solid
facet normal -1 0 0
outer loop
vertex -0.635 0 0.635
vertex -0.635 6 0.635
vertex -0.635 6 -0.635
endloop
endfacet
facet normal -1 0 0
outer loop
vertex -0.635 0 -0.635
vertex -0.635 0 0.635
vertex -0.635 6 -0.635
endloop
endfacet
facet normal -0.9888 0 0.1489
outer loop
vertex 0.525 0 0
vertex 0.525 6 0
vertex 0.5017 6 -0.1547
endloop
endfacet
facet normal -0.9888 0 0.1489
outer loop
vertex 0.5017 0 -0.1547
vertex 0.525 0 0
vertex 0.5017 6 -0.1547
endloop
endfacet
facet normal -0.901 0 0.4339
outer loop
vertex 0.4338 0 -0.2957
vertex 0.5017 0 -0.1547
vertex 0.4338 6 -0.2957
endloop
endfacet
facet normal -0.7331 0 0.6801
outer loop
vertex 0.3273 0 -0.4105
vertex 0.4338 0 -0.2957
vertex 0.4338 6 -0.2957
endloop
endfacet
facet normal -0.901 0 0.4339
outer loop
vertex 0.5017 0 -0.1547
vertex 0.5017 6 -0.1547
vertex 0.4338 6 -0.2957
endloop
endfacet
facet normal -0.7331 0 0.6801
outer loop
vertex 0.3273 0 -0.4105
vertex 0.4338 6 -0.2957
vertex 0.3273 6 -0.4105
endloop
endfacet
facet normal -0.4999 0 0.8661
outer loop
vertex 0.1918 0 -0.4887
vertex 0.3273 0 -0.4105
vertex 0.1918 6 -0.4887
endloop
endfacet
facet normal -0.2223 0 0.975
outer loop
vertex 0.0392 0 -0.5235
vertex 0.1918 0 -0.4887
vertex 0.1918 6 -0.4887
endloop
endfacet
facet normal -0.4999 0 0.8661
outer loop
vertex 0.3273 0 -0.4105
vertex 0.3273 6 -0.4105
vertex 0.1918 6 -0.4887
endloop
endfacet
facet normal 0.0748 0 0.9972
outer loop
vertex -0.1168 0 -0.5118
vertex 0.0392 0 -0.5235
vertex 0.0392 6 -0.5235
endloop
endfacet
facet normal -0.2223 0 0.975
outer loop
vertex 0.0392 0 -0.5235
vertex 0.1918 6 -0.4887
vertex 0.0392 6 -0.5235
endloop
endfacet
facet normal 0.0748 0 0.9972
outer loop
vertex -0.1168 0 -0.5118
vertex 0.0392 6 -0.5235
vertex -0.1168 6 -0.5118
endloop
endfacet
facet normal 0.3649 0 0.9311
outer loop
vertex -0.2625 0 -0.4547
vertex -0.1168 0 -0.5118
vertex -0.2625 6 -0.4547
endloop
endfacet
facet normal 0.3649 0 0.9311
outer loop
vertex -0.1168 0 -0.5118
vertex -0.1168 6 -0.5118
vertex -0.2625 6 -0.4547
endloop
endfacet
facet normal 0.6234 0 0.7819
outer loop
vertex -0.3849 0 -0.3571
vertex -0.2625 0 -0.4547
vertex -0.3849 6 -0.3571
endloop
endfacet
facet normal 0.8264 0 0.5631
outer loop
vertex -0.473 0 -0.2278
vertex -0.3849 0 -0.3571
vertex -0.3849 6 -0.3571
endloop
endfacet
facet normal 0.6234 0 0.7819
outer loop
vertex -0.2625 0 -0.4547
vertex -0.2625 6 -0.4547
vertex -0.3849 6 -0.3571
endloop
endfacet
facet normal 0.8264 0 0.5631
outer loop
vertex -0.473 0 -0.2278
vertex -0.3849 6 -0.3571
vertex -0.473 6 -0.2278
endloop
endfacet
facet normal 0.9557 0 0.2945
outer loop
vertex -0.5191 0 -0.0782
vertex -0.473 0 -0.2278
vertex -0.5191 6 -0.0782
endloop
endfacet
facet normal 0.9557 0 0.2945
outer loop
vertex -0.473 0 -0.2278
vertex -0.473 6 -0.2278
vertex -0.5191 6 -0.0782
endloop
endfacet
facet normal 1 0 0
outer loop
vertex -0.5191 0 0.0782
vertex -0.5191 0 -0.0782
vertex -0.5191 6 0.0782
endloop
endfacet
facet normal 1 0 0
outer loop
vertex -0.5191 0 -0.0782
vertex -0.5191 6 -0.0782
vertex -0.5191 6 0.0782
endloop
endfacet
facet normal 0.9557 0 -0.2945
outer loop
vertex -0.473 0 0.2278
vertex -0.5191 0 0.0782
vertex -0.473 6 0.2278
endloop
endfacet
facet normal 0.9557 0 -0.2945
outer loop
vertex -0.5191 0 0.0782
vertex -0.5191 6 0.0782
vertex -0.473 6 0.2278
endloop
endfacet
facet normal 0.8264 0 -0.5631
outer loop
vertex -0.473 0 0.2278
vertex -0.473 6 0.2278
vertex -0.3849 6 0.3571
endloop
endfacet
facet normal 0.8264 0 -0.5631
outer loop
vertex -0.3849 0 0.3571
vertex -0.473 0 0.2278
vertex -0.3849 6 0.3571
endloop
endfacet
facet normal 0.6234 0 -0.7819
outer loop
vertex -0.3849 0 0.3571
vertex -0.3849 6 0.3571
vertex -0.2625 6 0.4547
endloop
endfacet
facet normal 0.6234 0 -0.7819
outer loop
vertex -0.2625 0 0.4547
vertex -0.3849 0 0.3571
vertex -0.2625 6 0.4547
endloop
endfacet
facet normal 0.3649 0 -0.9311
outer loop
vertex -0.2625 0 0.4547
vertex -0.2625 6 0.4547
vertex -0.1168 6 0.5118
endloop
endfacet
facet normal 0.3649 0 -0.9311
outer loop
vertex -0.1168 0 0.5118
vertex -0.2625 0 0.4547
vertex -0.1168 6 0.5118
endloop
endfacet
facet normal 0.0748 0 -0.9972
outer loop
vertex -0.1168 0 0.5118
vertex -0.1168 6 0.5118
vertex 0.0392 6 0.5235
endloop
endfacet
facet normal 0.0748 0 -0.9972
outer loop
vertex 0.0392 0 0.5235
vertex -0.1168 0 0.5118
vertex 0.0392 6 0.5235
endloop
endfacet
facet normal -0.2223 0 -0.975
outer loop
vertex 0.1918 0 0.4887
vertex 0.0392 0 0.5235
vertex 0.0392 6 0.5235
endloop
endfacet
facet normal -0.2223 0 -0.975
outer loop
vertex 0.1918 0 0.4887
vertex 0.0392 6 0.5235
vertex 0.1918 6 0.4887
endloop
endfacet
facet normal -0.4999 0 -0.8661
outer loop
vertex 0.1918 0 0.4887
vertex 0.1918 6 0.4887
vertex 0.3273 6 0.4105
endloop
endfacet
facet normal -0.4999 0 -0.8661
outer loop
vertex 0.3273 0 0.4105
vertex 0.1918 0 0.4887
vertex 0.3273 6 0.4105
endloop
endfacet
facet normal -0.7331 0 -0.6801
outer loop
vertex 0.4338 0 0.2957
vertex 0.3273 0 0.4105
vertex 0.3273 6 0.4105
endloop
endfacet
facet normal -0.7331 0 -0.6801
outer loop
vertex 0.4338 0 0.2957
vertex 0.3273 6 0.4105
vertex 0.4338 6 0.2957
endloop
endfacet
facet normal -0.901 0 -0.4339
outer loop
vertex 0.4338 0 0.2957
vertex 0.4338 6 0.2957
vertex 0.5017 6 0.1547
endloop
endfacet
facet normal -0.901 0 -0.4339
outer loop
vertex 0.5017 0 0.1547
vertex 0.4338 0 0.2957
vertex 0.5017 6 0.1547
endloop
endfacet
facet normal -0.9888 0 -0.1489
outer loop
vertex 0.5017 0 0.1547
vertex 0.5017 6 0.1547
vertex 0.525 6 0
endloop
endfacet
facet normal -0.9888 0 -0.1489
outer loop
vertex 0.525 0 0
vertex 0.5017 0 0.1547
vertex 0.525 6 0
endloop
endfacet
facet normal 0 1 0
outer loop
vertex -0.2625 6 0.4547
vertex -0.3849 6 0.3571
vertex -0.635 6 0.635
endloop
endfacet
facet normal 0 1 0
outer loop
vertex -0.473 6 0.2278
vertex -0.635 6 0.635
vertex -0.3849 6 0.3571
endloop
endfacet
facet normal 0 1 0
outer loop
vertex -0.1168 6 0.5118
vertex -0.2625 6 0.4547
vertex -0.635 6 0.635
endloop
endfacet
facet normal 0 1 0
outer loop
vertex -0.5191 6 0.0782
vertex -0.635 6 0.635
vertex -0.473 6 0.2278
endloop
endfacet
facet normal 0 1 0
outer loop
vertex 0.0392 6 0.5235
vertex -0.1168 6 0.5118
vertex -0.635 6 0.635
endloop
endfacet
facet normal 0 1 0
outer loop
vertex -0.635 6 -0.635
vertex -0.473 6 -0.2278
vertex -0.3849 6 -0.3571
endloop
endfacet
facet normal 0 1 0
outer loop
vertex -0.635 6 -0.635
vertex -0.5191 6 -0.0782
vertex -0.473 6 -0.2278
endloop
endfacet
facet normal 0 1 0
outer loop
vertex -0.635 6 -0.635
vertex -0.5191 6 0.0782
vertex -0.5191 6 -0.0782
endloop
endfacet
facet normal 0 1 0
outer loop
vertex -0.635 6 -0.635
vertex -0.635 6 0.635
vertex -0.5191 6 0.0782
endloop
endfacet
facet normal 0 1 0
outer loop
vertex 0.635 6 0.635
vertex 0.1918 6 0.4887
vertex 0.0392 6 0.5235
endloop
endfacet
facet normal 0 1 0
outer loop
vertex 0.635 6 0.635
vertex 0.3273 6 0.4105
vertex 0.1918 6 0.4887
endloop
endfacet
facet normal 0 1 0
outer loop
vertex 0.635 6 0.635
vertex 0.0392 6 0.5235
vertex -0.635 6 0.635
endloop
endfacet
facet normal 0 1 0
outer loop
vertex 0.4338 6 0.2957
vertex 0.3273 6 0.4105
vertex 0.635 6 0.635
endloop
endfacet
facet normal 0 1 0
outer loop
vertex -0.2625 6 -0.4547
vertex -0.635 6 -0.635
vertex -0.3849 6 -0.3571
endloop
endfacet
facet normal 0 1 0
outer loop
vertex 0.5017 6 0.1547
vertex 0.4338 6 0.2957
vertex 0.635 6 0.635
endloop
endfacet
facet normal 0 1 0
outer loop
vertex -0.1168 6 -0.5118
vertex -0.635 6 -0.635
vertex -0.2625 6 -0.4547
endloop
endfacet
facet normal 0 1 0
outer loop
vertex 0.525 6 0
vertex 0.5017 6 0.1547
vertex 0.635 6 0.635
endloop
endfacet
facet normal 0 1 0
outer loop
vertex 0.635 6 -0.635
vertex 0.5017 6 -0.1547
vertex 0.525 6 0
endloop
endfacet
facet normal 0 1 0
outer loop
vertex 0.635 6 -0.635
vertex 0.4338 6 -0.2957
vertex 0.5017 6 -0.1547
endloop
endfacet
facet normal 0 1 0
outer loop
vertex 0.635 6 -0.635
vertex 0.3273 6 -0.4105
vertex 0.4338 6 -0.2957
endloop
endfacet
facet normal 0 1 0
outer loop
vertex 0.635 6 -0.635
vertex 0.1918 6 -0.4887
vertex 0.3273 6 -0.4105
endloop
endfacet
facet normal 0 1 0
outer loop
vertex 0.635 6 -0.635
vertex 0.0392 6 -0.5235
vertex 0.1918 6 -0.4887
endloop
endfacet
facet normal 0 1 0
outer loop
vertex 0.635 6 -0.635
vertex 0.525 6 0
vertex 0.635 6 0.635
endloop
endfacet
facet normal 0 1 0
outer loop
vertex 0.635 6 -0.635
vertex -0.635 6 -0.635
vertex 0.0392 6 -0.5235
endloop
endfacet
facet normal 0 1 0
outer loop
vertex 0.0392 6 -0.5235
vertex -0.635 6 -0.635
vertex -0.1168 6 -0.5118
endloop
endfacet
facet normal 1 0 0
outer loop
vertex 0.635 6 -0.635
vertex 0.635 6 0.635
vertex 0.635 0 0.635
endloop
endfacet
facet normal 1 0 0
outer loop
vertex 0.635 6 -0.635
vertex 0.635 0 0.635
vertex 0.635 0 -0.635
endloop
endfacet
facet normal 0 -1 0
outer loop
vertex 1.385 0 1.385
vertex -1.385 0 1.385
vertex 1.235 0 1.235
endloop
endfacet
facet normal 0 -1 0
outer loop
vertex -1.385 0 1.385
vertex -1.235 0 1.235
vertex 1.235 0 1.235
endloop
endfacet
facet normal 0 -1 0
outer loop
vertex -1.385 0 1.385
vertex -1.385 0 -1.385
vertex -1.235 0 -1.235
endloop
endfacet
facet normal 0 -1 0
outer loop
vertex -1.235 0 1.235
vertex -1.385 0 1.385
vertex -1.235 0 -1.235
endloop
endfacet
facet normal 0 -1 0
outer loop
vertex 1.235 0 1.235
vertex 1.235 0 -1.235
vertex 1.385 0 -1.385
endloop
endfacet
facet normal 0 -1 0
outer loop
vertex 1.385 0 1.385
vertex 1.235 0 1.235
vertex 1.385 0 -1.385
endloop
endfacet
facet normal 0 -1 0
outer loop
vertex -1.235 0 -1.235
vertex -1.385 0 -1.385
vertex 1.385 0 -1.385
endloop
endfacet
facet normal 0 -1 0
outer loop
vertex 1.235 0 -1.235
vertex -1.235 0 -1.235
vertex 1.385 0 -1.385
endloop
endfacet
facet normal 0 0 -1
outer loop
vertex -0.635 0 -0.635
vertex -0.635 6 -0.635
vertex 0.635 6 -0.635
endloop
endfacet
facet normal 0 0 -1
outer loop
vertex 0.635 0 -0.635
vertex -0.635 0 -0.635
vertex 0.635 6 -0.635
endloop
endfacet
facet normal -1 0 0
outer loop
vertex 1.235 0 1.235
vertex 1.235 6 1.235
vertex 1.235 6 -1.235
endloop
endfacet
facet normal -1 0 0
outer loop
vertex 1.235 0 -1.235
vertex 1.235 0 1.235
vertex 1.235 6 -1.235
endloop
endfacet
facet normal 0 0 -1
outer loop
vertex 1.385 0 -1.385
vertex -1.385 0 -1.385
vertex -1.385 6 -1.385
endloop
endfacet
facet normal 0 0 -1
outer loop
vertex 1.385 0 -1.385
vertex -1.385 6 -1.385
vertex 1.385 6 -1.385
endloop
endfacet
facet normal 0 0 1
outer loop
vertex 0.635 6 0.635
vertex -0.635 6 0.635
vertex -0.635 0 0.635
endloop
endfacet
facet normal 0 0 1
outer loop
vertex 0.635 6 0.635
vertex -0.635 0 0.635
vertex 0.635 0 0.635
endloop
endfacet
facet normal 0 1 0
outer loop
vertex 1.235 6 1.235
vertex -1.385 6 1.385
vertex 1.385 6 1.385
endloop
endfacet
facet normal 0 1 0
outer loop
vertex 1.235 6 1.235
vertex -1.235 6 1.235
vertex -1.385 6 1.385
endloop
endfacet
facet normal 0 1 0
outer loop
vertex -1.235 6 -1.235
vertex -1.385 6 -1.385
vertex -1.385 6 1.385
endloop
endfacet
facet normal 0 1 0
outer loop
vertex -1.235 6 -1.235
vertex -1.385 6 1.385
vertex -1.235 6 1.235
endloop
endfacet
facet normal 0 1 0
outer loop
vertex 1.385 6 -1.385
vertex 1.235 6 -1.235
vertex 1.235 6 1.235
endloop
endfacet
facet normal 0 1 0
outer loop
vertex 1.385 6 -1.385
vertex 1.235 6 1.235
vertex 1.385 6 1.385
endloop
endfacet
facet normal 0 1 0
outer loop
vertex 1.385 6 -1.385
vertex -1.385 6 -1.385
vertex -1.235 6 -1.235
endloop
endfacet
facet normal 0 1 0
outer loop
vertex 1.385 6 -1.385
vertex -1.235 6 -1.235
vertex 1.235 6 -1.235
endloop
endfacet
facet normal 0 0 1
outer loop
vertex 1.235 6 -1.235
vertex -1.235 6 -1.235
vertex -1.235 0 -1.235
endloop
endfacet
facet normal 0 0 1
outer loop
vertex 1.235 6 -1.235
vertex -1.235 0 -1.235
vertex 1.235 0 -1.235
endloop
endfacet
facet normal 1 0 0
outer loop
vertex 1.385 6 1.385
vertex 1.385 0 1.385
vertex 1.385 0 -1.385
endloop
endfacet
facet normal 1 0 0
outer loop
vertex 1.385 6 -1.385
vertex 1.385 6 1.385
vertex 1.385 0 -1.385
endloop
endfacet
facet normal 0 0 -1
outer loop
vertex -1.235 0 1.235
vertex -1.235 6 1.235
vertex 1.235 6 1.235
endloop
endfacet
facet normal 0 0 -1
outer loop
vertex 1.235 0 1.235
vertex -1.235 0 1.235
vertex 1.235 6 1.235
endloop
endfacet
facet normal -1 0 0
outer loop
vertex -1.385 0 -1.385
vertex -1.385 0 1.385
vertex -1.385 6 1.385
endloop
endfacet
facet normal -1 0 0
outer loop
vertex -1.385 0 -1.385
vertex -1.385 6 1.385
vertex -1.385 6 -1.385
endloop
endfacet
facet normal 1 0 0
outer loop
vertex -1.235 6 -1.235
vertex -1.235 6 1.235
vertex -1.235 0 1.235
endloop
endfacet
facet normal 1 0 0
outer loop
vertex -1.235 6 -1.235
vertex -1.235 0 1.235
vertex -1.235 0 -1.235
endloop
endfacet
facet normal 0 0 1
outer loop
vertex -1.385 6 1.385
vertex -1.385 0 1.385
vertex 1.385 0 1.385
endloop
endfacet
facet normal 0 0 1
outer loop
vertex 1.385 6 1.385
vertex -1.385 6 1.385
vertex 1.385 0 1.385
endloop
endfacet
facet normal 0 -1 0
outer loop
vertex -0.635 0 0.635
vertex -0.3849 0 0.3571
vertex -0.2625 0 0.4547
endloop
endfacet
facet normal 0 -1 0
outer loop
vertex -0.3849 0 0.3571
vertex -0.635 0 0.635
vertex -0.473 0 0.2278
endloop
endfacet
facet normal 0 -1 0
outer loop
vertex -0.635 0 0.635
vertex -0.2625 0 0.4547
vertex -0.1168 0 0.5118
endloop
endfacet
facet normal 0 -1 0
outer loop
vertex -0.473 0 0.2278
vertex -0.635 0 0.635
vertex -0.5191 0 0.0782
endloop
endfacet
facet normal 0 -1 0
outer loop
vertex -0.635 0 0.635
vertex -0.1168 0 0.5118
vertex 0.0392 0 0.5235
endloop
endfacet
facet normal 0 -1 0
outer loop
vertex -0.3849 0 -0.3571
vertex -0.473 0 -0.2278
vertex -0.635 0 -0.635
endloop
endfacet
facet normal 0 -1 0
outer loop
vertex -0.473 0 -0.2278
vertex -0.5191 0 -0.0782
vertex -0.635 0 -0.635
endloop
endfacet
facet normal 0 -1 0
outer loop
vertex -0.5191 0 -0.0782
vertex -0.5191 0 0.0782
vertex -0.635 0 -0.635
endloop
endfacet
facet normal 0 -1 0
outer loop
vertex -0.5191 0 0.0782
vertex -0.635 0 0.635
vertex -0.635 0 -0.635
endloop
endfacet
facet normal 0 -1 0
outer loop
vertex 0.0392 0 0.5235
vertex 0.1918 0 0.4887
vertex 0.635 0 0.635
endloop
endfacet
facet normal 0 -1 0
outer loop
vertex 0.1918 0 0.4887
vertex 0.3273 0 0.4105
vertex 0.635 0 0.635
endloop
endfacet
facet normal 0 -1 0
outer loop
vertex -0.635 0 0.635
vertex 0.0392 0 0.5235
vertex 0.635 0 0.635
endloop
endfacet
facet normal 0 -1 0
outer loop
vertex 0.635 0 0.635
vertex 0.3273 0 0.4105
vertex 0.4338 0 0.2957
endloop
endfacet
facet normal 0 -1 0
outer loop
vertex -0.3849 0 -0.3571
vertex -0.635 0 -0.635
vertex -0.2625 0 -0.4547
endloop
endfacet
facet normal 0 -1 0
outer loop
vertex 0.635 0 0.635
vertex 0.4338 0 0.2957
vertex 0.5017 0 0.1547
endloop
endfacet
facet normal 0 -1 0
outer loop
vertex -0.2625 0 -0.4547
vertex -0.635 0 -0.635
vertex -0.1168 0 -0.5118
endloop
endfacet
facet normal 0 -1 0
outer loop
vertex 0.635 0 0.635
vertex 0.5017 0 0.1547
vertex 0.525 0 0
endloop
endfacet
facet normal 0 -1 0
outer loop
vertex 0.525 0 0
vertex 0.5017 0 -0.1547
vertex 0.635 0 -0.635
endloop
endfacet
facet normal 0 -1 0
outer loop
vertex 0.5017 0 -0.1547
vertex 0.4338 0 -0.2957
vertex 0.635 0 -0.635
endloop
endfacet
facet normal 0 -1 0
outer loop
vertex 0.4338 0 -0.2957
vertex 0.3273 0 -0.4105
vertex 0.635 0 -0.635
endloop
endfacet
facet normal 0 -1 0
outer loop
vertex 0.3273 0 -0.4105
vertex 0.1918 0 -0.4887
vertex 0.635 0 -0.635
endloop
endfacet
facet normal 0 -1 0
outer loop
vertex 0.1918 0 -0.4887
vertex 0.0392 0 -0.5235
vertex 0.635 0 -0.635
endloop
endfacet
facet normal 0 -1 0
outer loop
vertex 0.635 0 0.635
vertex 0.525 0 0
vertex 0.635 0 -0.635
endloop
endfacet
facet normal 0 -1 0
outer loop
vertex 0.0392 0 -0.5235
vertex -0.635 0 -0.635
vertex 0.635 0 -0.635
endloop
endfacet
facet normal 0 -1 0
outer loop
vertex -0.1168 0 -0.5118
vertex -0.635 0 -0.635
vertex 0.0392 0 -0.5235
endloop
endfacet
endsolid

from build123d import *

# Parameters (mm, degrees)
SKETCH1_W           = 2.77
SKETCH1_H           = 2.77
BOSS_EXTRUDE1_DEPTH = 6
SKETCH2_R           = 0.525
CUT_EXTRUDE1_DEPTH  = 7
SKETCH3_W           = 2.47
SKETCH3_H           = 2.47
SKETCH3_W_2         = 1.27
SKETCH3_H_2         = 1.27
CUT_EXTRUDE2_DEPTH  = 10


with BuildPart() as part:
    # Sketch1 → Boss-Extrude1 (new body)
    with BuildSketch(Plane(origin=(0, 0, 0), x_dir=(1, 0, 0), z_dir=(0, 1, 0))):
        Rectangle(SKETCH1_W, SKETCH1_H)
    extrude(amount=BOSS_EXTRUDE1_DEPTH)

    # Sketch2 → Cut-Extrude1 (cut, through all)
    with BuildSketch(Plane(origin=(0, 6, 0), x_dir=(1, 0, 0), z_dir=(0, 1, 0))):
        Circle(SKETCH2_R)
    extrude(amount=-CUT_EXTRUDE1_DEPTH, mode=Mode.SUBTRACT)

    # Sketch3 → Cut-Extrude2 (cut)
    with BuildSketch(Plane(origin=(0, 6, 0), x_dir=(1, 0, 0), z_dir=(0, 1, 0))):
        Rectangle(SKETCH3_W, SKETCH3_H)
        Rectangle(SKETCH3_W_2, SKETCH3_H_2, mode=Mode.SUBTRACT)
    extrude(amount=-CUT_EXTRUDE2_DEPTH, mode=Mode.SUBTRACT)


solid = part.part
